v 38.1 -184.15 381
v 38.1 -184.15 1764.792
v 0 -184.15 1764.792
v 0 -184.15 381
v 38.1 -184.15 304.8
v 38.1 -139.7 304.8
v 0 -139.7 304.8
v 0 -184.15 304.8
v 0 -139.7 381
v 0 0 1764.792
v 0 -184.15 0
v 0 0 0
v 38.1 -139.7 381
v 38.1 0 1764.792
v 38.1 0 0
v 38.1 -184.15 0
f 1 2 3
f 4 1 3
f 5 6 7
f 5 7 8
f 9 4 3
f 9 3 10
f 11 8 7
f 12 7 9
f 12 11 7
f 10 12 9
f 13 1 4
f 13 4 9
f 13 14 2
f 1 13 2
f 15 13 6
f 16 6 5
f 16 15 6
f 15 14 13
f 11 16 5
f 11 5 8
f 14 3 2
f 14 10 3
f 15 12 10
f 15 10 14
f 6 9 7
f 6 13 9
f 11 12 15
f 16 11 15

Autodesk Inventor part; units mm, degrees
ref_plane "YZ Plane" through (0, 0, 0) normal (1, 0, 0) x (0, 1, 0)
ref_plane "XZ Plane" through (0, 0, 0) normal (0, 1, 0) x (-1, 0, 0)
ref_plane "XY Plane" through (0, 0, 0) normal (0, 0, 1) x (1, 0, 0)
sketch "Sketch1" plane through (0, 0, 0) normal (0, 0, 1) x (1, 0, 0)
  line L0 (0, 0) -> (38.1, 0)
  line L1 (38.1, 0) -> (38.1, -184.15)
  line L2 (38.1, -184.15) -> (0, -184.15)
  line L3 (0, -184.15) -> (0, 0)
  dimension "d0" = 38.1
  dimension "d1" = 184.15
extrude "Extrusion1" add sketch "Sketch1" along normal blind 1764.792
sketch "Sketch2" plane through (38.1, -184.15, 0) normal (1, 0, 0) x (0, 0, -1)
  line L0 (0, 0) -> (-1764.792, 0) projected
  line L1 (-381, 0) -> (-381, 44.45)
  line L2 (-381, 44.45) -> (-304.8, 44.45)
  line L3 (-304.8, 44.45) -> (-304.8, 0)
  line L4 (0, 184.15) -> (0, 0) projected
  dimension "d4" = 44.45
  dimension "d5" = 76.2
  dimension "d6" = 304.8
extrude "Extrusion2" cut sketch "Sketch2" against normal through all
properties part number "Left End Board" material "Wood (Birch)"
